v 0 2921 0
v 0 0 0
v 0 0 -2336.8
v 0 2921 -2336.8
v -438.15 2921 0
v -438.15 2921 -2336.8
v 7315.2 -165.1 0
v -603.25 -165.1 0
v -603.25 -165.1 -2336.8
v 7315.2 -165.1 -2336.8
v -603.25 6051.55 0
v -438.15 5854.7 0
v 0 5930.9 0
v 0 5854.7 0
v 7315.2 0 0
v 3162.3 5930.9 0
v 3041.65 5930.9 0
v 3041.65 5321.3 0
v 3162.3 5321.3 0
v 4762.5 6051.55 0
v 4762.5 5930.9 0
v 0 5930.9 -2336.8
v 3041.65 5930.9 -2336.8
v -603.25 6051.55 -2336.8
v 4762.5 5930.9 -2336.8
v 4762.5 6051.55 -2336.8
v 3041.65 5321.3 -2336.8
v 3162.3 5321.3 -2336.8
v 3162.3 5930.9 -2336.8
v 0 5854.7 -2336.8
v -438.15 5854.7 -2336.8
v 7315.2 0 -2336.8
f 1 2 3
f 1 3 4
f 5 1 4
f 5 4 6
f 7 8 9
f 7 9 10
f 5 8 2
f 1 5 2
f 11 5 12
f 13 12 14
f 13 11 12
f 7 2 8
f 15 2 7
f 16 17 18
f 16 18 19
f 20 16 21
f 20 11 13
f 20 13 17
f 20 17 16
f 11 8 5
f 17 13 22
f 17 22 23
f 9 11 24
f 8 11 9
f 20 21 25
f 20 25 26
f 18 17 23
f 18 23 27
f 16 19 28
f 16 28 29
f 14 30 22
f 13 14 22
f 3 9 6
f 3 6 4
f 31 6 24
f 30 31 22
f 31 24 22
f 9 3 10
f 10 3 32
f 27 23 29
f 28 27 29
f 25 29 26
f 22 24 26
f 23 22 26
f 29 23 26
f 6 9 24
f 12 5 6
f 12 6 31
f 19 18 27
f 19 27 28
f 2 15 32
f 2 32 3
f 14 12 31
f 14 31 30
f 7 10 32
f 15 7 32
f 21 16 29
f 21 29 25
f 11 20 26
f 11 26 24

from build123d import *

# Parameters (mm, degrees)
F1_DEPTH = 2336.8


with BuildPart() as f1:
    # F0 (on Top) → F1 (new body)
    with BuildSketch(Plane.XY):
        Polygon((7315.2, 0), (0, 0), (0, 2921), (-438.15, 2921), (-438.15, 5854.7), (0, 5854.7), (0, 5930.9), (3041.65, 5930.9), (3041.65, 5321.3), (3162.3, 5321.3), (3162.3, 5930.9), (4762.5, 5930.9), (4762.5, 6051.55), (0, 6051.55), (-603.25, 6051.55), (-603.25, -165.1), (7315.2, -165.1), align=None)
    extrude(amount=-F1_DEPTH)


solid = f1.part
